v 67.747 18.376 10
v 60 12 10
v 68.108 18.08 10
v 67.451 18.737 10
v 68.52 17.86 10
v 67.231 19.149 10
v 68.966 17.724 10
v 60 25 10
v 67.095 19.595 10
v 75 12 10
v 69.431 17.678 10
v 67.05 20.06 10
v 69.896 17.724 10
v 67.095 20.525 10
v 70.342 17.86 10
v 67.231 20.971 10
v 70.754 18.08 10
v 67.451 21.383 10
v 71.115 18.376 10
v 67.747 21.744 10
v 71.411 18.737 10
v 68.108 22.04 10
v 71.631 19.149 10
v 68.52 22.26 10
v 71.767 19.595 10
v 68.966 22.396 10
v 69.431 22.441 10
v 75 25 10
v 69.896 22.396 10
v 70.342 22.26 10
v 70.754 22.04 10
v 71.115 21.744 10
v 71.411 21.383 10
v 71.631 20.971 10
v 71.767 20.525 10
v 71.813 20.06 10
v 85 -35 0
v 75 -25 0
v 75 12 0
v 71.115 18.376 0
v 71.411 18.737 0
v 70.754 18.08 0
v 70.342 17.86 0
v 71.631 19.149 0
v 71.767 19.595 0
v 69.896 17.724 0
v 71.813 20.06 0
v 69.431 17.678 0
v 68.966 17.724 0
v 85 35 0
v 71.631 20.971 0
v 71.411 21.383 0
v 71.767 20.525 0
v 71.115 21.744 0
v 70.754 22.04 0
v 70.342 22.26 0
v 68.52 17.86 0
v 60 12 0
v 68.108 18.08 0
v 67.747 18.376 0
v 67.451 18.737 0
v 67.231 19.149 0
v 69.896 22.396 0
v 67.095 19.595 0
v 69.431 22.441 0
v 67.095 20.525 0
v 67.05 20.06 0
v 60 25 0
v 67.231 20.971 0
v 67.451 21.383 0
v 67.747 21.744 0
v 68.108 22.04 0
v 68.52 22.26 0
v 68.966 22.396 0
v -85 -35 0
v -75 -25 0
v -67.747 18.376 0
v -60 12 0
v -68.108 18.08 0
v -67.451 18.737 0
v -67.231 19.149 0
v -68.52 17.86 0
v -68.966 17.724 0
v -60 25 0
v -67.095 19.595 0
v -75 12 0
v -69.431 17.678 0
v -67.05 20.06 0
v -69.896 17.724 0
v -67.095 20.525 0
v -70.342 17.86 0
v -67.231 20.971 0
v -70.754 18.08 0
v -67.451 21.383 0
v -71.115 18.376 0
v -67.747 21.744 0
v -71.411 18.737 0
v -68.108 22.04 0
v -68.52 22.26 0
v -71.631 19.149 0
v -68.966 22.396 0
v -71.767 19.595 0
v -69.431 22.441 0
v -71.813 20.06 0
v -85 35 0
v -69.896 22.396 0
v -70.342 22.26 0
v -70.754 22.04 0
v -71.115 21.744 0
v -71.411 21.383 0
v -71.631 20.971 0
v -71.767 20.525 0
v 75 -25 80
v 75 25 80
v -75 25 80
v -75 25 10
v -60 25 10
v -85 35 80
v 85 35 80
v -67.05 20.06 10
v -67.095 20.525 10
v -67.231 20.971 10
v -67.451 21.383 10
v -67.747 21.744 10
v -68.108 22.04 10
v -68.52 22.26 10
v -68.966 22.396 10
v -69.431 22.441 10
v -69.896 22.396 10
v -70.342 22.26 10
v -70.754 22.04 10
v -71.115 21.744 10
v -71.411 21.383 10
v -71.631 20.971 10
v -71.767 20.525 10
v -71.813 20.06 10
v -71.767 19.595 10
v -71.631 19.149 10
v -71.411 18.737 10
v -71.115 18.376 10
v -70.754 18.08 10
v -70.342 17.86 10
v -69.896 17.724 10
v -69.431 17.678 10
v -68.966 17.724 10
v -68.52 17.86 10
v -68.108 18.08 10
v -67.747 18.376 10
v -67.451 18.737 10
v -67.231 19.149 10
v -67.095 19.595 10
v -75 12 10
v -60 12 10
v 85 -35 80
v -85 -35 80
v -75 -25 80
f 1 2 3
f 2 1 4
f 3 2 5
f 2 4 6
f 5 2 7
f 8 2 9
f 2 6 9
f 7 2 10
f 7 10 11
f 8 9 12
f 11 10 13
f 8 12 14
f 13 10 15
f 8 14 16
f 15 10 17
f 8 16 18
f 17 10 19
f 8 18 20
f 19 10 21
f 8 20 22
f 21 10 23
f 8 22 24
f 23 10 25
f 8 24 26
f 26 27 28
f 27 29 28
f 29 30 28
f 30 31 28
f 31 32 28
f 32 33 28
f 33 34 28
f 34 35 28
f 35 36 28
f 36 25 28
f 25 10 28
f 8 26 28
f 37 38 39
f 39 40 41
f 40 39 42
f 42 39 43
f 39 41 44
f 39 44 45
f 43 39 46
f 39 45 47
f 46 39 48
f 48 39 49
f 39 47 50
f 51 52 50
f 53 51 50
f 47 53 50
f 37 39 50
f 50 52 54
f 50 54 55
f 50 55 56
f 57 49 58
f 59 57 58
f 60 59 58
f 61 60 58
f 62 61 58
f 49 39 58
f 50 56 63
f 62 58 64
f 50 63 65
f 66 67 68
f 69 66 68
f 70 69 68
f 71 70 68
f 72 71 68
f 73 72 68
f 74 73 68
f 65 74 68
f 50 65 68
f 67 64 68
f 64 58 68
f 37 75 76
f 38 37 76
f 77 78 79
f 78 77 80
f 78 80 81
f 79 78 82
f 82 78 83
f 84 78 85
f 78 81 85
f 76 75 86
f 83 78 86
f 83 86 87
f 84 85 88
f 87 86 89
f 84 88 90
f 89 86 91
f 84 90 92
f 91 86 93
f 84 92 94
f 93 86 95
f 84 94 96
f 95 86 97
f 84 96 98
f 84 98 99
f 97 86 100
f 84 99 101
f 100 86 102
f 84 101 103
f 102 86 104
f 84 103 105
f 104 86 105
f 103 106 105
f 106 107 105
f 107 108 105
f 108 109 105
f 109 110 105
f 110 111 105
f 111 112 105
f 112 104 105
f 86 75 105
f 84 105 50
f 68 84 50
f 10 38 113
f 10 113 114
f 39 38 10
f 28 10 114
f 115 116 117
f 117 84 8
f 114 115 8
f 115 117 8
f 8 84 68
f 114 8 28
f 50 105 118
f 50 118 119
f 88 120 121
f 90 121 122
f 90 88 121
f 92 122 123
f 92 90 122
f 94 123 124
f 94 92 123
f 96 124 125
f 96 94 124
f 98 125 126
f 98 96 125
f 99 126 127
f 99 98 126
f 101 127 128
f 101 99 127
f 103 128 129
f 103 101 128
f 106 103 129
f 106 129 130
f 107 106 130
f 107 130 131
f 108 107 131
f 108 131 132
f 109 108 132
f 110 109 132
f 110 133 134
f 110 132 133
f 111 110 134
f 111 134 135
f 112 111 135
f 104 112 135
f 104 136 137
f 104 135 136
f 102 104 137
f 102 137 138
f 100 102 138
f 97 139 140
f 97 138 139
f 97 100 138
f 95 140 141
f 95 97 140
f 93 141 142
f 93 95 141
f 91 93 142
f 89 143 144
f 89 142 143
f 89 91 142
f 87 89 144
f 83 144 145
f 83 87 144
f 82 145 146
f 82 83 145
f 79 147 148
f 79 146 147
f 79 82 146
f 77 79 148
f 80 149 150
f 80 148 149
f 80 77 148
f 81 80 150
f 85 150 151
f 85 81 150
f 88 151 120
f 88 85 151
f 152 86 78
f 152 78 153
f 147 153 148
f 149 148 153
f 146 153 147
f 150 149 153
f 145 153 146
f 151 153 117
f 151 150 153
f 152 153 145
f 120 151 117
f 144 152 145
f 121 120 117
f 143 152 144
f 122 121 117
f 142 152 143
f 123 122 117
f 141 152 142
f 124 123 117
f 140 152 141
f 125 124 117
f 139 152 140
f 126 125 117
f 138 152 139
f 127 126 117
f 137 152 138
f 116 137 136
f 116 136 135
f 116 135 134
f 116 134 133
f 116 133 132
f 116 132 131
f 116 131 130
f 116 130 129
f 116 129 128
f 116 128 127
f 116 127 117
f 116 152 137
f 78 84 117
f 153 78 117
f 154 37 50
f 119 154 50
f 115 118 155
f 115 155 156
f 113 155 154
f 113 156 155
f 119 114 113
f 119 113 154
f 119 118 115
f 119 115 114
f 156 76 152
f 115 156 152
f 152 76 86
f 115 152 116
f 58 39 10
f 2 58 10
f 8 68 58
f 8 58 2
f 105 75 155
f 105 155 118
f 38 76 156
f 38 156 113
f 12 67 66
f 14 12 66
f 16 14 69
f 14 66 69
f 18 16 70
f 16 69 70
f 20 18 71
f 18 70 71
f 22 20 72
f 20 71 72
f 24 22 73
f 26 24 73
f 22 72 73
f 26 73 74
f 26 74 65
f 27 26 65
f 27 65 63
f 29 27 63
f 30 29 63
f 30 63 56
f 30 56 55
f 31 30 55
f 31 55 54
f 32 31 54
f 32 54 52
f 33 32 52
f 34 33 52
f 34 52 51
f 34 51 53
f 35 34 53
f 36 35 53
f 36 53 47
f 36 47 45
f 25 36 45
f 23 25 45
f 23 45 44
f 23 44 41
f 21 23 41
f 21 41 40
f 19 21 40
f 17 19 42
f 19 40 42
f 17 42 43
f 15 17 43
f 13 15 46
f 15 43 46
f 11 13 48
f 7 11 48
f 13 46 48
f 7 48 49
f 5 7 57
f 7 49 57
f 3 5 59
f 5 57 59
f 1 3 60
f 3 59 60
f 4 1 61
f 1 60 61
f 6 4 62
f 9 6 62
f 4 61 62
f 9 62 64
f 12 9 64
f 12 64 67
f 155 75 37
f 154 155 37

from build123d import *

# Parameters (mm, degrees)
SKETCH1_W           = 170
SKETCH1_H           = 70
SKETCH1_W_2         = 150
SKETCH1_H_2         = 50
BOSS_EXTRUDE1_DEPTH = 80
SKETCH2_W           = 10
SKETCH2_H           = 13
BOSS_EXTRUDE2_DEPTH = 15
SKETCH3_R           = 2.381541705
CUT_EXTRUDE1_DEPTH  = 15


with BuildPart() as part:
    # Sketch1 → Boss-Extrude1 (new body)
    with BuildSketch(Plane.XY):
        Rectangle(SKETCH1_W, SKETCH1_H)
        Rectangle(SKETCH1_W_2, SKETCH1_H_2, mode=Mode.SUBTRACT)
    extrude(amount=BOSS_EXTRUDE1_DEPTH)

    # Sketch2 → Boss-Extrude2 (add)
    with BuildSketch(Plane.ZY.offset(-75)):
        with Locations((5, 18.5)):
            Rectangle(SKETCH2_W, SKETCH2_H)
    boss_extrude2 = extrude(amount=BOSS_EXTRUDE2_DEPTH)

    # Sketch3 → Cut-Extrude1 (cut)
    with BuildSketch(Plane(origin=(0, 0, 0), x_dir=(-1, 0, 0), z_dir=(0, 0, -1))):
        with Locations((-69.43110047, 20.059908975)):
            Circle(SKETCH3_R)
    cut_extrude1 = extrude(amount=-CUT_EXTRUDE1_DEPTH, mode=Mode.SUBTRACT)

    # Mirror1: Boss-Extrude2, Cut-Extrude1 across plane
    add(boss_extrude2.mirror(Plane(origin=(0, 0, 0), x_dir=(0, 0, 1), z_dir=(1, 0, 0))))
    add(cut_extrude1.mirror(Plane(origin=(0, 0, 0), x_dir=(0, 0, 1), z_dir=(1, 0, 0))), mode=Mode.SUBTRACT)


solid = part.part
